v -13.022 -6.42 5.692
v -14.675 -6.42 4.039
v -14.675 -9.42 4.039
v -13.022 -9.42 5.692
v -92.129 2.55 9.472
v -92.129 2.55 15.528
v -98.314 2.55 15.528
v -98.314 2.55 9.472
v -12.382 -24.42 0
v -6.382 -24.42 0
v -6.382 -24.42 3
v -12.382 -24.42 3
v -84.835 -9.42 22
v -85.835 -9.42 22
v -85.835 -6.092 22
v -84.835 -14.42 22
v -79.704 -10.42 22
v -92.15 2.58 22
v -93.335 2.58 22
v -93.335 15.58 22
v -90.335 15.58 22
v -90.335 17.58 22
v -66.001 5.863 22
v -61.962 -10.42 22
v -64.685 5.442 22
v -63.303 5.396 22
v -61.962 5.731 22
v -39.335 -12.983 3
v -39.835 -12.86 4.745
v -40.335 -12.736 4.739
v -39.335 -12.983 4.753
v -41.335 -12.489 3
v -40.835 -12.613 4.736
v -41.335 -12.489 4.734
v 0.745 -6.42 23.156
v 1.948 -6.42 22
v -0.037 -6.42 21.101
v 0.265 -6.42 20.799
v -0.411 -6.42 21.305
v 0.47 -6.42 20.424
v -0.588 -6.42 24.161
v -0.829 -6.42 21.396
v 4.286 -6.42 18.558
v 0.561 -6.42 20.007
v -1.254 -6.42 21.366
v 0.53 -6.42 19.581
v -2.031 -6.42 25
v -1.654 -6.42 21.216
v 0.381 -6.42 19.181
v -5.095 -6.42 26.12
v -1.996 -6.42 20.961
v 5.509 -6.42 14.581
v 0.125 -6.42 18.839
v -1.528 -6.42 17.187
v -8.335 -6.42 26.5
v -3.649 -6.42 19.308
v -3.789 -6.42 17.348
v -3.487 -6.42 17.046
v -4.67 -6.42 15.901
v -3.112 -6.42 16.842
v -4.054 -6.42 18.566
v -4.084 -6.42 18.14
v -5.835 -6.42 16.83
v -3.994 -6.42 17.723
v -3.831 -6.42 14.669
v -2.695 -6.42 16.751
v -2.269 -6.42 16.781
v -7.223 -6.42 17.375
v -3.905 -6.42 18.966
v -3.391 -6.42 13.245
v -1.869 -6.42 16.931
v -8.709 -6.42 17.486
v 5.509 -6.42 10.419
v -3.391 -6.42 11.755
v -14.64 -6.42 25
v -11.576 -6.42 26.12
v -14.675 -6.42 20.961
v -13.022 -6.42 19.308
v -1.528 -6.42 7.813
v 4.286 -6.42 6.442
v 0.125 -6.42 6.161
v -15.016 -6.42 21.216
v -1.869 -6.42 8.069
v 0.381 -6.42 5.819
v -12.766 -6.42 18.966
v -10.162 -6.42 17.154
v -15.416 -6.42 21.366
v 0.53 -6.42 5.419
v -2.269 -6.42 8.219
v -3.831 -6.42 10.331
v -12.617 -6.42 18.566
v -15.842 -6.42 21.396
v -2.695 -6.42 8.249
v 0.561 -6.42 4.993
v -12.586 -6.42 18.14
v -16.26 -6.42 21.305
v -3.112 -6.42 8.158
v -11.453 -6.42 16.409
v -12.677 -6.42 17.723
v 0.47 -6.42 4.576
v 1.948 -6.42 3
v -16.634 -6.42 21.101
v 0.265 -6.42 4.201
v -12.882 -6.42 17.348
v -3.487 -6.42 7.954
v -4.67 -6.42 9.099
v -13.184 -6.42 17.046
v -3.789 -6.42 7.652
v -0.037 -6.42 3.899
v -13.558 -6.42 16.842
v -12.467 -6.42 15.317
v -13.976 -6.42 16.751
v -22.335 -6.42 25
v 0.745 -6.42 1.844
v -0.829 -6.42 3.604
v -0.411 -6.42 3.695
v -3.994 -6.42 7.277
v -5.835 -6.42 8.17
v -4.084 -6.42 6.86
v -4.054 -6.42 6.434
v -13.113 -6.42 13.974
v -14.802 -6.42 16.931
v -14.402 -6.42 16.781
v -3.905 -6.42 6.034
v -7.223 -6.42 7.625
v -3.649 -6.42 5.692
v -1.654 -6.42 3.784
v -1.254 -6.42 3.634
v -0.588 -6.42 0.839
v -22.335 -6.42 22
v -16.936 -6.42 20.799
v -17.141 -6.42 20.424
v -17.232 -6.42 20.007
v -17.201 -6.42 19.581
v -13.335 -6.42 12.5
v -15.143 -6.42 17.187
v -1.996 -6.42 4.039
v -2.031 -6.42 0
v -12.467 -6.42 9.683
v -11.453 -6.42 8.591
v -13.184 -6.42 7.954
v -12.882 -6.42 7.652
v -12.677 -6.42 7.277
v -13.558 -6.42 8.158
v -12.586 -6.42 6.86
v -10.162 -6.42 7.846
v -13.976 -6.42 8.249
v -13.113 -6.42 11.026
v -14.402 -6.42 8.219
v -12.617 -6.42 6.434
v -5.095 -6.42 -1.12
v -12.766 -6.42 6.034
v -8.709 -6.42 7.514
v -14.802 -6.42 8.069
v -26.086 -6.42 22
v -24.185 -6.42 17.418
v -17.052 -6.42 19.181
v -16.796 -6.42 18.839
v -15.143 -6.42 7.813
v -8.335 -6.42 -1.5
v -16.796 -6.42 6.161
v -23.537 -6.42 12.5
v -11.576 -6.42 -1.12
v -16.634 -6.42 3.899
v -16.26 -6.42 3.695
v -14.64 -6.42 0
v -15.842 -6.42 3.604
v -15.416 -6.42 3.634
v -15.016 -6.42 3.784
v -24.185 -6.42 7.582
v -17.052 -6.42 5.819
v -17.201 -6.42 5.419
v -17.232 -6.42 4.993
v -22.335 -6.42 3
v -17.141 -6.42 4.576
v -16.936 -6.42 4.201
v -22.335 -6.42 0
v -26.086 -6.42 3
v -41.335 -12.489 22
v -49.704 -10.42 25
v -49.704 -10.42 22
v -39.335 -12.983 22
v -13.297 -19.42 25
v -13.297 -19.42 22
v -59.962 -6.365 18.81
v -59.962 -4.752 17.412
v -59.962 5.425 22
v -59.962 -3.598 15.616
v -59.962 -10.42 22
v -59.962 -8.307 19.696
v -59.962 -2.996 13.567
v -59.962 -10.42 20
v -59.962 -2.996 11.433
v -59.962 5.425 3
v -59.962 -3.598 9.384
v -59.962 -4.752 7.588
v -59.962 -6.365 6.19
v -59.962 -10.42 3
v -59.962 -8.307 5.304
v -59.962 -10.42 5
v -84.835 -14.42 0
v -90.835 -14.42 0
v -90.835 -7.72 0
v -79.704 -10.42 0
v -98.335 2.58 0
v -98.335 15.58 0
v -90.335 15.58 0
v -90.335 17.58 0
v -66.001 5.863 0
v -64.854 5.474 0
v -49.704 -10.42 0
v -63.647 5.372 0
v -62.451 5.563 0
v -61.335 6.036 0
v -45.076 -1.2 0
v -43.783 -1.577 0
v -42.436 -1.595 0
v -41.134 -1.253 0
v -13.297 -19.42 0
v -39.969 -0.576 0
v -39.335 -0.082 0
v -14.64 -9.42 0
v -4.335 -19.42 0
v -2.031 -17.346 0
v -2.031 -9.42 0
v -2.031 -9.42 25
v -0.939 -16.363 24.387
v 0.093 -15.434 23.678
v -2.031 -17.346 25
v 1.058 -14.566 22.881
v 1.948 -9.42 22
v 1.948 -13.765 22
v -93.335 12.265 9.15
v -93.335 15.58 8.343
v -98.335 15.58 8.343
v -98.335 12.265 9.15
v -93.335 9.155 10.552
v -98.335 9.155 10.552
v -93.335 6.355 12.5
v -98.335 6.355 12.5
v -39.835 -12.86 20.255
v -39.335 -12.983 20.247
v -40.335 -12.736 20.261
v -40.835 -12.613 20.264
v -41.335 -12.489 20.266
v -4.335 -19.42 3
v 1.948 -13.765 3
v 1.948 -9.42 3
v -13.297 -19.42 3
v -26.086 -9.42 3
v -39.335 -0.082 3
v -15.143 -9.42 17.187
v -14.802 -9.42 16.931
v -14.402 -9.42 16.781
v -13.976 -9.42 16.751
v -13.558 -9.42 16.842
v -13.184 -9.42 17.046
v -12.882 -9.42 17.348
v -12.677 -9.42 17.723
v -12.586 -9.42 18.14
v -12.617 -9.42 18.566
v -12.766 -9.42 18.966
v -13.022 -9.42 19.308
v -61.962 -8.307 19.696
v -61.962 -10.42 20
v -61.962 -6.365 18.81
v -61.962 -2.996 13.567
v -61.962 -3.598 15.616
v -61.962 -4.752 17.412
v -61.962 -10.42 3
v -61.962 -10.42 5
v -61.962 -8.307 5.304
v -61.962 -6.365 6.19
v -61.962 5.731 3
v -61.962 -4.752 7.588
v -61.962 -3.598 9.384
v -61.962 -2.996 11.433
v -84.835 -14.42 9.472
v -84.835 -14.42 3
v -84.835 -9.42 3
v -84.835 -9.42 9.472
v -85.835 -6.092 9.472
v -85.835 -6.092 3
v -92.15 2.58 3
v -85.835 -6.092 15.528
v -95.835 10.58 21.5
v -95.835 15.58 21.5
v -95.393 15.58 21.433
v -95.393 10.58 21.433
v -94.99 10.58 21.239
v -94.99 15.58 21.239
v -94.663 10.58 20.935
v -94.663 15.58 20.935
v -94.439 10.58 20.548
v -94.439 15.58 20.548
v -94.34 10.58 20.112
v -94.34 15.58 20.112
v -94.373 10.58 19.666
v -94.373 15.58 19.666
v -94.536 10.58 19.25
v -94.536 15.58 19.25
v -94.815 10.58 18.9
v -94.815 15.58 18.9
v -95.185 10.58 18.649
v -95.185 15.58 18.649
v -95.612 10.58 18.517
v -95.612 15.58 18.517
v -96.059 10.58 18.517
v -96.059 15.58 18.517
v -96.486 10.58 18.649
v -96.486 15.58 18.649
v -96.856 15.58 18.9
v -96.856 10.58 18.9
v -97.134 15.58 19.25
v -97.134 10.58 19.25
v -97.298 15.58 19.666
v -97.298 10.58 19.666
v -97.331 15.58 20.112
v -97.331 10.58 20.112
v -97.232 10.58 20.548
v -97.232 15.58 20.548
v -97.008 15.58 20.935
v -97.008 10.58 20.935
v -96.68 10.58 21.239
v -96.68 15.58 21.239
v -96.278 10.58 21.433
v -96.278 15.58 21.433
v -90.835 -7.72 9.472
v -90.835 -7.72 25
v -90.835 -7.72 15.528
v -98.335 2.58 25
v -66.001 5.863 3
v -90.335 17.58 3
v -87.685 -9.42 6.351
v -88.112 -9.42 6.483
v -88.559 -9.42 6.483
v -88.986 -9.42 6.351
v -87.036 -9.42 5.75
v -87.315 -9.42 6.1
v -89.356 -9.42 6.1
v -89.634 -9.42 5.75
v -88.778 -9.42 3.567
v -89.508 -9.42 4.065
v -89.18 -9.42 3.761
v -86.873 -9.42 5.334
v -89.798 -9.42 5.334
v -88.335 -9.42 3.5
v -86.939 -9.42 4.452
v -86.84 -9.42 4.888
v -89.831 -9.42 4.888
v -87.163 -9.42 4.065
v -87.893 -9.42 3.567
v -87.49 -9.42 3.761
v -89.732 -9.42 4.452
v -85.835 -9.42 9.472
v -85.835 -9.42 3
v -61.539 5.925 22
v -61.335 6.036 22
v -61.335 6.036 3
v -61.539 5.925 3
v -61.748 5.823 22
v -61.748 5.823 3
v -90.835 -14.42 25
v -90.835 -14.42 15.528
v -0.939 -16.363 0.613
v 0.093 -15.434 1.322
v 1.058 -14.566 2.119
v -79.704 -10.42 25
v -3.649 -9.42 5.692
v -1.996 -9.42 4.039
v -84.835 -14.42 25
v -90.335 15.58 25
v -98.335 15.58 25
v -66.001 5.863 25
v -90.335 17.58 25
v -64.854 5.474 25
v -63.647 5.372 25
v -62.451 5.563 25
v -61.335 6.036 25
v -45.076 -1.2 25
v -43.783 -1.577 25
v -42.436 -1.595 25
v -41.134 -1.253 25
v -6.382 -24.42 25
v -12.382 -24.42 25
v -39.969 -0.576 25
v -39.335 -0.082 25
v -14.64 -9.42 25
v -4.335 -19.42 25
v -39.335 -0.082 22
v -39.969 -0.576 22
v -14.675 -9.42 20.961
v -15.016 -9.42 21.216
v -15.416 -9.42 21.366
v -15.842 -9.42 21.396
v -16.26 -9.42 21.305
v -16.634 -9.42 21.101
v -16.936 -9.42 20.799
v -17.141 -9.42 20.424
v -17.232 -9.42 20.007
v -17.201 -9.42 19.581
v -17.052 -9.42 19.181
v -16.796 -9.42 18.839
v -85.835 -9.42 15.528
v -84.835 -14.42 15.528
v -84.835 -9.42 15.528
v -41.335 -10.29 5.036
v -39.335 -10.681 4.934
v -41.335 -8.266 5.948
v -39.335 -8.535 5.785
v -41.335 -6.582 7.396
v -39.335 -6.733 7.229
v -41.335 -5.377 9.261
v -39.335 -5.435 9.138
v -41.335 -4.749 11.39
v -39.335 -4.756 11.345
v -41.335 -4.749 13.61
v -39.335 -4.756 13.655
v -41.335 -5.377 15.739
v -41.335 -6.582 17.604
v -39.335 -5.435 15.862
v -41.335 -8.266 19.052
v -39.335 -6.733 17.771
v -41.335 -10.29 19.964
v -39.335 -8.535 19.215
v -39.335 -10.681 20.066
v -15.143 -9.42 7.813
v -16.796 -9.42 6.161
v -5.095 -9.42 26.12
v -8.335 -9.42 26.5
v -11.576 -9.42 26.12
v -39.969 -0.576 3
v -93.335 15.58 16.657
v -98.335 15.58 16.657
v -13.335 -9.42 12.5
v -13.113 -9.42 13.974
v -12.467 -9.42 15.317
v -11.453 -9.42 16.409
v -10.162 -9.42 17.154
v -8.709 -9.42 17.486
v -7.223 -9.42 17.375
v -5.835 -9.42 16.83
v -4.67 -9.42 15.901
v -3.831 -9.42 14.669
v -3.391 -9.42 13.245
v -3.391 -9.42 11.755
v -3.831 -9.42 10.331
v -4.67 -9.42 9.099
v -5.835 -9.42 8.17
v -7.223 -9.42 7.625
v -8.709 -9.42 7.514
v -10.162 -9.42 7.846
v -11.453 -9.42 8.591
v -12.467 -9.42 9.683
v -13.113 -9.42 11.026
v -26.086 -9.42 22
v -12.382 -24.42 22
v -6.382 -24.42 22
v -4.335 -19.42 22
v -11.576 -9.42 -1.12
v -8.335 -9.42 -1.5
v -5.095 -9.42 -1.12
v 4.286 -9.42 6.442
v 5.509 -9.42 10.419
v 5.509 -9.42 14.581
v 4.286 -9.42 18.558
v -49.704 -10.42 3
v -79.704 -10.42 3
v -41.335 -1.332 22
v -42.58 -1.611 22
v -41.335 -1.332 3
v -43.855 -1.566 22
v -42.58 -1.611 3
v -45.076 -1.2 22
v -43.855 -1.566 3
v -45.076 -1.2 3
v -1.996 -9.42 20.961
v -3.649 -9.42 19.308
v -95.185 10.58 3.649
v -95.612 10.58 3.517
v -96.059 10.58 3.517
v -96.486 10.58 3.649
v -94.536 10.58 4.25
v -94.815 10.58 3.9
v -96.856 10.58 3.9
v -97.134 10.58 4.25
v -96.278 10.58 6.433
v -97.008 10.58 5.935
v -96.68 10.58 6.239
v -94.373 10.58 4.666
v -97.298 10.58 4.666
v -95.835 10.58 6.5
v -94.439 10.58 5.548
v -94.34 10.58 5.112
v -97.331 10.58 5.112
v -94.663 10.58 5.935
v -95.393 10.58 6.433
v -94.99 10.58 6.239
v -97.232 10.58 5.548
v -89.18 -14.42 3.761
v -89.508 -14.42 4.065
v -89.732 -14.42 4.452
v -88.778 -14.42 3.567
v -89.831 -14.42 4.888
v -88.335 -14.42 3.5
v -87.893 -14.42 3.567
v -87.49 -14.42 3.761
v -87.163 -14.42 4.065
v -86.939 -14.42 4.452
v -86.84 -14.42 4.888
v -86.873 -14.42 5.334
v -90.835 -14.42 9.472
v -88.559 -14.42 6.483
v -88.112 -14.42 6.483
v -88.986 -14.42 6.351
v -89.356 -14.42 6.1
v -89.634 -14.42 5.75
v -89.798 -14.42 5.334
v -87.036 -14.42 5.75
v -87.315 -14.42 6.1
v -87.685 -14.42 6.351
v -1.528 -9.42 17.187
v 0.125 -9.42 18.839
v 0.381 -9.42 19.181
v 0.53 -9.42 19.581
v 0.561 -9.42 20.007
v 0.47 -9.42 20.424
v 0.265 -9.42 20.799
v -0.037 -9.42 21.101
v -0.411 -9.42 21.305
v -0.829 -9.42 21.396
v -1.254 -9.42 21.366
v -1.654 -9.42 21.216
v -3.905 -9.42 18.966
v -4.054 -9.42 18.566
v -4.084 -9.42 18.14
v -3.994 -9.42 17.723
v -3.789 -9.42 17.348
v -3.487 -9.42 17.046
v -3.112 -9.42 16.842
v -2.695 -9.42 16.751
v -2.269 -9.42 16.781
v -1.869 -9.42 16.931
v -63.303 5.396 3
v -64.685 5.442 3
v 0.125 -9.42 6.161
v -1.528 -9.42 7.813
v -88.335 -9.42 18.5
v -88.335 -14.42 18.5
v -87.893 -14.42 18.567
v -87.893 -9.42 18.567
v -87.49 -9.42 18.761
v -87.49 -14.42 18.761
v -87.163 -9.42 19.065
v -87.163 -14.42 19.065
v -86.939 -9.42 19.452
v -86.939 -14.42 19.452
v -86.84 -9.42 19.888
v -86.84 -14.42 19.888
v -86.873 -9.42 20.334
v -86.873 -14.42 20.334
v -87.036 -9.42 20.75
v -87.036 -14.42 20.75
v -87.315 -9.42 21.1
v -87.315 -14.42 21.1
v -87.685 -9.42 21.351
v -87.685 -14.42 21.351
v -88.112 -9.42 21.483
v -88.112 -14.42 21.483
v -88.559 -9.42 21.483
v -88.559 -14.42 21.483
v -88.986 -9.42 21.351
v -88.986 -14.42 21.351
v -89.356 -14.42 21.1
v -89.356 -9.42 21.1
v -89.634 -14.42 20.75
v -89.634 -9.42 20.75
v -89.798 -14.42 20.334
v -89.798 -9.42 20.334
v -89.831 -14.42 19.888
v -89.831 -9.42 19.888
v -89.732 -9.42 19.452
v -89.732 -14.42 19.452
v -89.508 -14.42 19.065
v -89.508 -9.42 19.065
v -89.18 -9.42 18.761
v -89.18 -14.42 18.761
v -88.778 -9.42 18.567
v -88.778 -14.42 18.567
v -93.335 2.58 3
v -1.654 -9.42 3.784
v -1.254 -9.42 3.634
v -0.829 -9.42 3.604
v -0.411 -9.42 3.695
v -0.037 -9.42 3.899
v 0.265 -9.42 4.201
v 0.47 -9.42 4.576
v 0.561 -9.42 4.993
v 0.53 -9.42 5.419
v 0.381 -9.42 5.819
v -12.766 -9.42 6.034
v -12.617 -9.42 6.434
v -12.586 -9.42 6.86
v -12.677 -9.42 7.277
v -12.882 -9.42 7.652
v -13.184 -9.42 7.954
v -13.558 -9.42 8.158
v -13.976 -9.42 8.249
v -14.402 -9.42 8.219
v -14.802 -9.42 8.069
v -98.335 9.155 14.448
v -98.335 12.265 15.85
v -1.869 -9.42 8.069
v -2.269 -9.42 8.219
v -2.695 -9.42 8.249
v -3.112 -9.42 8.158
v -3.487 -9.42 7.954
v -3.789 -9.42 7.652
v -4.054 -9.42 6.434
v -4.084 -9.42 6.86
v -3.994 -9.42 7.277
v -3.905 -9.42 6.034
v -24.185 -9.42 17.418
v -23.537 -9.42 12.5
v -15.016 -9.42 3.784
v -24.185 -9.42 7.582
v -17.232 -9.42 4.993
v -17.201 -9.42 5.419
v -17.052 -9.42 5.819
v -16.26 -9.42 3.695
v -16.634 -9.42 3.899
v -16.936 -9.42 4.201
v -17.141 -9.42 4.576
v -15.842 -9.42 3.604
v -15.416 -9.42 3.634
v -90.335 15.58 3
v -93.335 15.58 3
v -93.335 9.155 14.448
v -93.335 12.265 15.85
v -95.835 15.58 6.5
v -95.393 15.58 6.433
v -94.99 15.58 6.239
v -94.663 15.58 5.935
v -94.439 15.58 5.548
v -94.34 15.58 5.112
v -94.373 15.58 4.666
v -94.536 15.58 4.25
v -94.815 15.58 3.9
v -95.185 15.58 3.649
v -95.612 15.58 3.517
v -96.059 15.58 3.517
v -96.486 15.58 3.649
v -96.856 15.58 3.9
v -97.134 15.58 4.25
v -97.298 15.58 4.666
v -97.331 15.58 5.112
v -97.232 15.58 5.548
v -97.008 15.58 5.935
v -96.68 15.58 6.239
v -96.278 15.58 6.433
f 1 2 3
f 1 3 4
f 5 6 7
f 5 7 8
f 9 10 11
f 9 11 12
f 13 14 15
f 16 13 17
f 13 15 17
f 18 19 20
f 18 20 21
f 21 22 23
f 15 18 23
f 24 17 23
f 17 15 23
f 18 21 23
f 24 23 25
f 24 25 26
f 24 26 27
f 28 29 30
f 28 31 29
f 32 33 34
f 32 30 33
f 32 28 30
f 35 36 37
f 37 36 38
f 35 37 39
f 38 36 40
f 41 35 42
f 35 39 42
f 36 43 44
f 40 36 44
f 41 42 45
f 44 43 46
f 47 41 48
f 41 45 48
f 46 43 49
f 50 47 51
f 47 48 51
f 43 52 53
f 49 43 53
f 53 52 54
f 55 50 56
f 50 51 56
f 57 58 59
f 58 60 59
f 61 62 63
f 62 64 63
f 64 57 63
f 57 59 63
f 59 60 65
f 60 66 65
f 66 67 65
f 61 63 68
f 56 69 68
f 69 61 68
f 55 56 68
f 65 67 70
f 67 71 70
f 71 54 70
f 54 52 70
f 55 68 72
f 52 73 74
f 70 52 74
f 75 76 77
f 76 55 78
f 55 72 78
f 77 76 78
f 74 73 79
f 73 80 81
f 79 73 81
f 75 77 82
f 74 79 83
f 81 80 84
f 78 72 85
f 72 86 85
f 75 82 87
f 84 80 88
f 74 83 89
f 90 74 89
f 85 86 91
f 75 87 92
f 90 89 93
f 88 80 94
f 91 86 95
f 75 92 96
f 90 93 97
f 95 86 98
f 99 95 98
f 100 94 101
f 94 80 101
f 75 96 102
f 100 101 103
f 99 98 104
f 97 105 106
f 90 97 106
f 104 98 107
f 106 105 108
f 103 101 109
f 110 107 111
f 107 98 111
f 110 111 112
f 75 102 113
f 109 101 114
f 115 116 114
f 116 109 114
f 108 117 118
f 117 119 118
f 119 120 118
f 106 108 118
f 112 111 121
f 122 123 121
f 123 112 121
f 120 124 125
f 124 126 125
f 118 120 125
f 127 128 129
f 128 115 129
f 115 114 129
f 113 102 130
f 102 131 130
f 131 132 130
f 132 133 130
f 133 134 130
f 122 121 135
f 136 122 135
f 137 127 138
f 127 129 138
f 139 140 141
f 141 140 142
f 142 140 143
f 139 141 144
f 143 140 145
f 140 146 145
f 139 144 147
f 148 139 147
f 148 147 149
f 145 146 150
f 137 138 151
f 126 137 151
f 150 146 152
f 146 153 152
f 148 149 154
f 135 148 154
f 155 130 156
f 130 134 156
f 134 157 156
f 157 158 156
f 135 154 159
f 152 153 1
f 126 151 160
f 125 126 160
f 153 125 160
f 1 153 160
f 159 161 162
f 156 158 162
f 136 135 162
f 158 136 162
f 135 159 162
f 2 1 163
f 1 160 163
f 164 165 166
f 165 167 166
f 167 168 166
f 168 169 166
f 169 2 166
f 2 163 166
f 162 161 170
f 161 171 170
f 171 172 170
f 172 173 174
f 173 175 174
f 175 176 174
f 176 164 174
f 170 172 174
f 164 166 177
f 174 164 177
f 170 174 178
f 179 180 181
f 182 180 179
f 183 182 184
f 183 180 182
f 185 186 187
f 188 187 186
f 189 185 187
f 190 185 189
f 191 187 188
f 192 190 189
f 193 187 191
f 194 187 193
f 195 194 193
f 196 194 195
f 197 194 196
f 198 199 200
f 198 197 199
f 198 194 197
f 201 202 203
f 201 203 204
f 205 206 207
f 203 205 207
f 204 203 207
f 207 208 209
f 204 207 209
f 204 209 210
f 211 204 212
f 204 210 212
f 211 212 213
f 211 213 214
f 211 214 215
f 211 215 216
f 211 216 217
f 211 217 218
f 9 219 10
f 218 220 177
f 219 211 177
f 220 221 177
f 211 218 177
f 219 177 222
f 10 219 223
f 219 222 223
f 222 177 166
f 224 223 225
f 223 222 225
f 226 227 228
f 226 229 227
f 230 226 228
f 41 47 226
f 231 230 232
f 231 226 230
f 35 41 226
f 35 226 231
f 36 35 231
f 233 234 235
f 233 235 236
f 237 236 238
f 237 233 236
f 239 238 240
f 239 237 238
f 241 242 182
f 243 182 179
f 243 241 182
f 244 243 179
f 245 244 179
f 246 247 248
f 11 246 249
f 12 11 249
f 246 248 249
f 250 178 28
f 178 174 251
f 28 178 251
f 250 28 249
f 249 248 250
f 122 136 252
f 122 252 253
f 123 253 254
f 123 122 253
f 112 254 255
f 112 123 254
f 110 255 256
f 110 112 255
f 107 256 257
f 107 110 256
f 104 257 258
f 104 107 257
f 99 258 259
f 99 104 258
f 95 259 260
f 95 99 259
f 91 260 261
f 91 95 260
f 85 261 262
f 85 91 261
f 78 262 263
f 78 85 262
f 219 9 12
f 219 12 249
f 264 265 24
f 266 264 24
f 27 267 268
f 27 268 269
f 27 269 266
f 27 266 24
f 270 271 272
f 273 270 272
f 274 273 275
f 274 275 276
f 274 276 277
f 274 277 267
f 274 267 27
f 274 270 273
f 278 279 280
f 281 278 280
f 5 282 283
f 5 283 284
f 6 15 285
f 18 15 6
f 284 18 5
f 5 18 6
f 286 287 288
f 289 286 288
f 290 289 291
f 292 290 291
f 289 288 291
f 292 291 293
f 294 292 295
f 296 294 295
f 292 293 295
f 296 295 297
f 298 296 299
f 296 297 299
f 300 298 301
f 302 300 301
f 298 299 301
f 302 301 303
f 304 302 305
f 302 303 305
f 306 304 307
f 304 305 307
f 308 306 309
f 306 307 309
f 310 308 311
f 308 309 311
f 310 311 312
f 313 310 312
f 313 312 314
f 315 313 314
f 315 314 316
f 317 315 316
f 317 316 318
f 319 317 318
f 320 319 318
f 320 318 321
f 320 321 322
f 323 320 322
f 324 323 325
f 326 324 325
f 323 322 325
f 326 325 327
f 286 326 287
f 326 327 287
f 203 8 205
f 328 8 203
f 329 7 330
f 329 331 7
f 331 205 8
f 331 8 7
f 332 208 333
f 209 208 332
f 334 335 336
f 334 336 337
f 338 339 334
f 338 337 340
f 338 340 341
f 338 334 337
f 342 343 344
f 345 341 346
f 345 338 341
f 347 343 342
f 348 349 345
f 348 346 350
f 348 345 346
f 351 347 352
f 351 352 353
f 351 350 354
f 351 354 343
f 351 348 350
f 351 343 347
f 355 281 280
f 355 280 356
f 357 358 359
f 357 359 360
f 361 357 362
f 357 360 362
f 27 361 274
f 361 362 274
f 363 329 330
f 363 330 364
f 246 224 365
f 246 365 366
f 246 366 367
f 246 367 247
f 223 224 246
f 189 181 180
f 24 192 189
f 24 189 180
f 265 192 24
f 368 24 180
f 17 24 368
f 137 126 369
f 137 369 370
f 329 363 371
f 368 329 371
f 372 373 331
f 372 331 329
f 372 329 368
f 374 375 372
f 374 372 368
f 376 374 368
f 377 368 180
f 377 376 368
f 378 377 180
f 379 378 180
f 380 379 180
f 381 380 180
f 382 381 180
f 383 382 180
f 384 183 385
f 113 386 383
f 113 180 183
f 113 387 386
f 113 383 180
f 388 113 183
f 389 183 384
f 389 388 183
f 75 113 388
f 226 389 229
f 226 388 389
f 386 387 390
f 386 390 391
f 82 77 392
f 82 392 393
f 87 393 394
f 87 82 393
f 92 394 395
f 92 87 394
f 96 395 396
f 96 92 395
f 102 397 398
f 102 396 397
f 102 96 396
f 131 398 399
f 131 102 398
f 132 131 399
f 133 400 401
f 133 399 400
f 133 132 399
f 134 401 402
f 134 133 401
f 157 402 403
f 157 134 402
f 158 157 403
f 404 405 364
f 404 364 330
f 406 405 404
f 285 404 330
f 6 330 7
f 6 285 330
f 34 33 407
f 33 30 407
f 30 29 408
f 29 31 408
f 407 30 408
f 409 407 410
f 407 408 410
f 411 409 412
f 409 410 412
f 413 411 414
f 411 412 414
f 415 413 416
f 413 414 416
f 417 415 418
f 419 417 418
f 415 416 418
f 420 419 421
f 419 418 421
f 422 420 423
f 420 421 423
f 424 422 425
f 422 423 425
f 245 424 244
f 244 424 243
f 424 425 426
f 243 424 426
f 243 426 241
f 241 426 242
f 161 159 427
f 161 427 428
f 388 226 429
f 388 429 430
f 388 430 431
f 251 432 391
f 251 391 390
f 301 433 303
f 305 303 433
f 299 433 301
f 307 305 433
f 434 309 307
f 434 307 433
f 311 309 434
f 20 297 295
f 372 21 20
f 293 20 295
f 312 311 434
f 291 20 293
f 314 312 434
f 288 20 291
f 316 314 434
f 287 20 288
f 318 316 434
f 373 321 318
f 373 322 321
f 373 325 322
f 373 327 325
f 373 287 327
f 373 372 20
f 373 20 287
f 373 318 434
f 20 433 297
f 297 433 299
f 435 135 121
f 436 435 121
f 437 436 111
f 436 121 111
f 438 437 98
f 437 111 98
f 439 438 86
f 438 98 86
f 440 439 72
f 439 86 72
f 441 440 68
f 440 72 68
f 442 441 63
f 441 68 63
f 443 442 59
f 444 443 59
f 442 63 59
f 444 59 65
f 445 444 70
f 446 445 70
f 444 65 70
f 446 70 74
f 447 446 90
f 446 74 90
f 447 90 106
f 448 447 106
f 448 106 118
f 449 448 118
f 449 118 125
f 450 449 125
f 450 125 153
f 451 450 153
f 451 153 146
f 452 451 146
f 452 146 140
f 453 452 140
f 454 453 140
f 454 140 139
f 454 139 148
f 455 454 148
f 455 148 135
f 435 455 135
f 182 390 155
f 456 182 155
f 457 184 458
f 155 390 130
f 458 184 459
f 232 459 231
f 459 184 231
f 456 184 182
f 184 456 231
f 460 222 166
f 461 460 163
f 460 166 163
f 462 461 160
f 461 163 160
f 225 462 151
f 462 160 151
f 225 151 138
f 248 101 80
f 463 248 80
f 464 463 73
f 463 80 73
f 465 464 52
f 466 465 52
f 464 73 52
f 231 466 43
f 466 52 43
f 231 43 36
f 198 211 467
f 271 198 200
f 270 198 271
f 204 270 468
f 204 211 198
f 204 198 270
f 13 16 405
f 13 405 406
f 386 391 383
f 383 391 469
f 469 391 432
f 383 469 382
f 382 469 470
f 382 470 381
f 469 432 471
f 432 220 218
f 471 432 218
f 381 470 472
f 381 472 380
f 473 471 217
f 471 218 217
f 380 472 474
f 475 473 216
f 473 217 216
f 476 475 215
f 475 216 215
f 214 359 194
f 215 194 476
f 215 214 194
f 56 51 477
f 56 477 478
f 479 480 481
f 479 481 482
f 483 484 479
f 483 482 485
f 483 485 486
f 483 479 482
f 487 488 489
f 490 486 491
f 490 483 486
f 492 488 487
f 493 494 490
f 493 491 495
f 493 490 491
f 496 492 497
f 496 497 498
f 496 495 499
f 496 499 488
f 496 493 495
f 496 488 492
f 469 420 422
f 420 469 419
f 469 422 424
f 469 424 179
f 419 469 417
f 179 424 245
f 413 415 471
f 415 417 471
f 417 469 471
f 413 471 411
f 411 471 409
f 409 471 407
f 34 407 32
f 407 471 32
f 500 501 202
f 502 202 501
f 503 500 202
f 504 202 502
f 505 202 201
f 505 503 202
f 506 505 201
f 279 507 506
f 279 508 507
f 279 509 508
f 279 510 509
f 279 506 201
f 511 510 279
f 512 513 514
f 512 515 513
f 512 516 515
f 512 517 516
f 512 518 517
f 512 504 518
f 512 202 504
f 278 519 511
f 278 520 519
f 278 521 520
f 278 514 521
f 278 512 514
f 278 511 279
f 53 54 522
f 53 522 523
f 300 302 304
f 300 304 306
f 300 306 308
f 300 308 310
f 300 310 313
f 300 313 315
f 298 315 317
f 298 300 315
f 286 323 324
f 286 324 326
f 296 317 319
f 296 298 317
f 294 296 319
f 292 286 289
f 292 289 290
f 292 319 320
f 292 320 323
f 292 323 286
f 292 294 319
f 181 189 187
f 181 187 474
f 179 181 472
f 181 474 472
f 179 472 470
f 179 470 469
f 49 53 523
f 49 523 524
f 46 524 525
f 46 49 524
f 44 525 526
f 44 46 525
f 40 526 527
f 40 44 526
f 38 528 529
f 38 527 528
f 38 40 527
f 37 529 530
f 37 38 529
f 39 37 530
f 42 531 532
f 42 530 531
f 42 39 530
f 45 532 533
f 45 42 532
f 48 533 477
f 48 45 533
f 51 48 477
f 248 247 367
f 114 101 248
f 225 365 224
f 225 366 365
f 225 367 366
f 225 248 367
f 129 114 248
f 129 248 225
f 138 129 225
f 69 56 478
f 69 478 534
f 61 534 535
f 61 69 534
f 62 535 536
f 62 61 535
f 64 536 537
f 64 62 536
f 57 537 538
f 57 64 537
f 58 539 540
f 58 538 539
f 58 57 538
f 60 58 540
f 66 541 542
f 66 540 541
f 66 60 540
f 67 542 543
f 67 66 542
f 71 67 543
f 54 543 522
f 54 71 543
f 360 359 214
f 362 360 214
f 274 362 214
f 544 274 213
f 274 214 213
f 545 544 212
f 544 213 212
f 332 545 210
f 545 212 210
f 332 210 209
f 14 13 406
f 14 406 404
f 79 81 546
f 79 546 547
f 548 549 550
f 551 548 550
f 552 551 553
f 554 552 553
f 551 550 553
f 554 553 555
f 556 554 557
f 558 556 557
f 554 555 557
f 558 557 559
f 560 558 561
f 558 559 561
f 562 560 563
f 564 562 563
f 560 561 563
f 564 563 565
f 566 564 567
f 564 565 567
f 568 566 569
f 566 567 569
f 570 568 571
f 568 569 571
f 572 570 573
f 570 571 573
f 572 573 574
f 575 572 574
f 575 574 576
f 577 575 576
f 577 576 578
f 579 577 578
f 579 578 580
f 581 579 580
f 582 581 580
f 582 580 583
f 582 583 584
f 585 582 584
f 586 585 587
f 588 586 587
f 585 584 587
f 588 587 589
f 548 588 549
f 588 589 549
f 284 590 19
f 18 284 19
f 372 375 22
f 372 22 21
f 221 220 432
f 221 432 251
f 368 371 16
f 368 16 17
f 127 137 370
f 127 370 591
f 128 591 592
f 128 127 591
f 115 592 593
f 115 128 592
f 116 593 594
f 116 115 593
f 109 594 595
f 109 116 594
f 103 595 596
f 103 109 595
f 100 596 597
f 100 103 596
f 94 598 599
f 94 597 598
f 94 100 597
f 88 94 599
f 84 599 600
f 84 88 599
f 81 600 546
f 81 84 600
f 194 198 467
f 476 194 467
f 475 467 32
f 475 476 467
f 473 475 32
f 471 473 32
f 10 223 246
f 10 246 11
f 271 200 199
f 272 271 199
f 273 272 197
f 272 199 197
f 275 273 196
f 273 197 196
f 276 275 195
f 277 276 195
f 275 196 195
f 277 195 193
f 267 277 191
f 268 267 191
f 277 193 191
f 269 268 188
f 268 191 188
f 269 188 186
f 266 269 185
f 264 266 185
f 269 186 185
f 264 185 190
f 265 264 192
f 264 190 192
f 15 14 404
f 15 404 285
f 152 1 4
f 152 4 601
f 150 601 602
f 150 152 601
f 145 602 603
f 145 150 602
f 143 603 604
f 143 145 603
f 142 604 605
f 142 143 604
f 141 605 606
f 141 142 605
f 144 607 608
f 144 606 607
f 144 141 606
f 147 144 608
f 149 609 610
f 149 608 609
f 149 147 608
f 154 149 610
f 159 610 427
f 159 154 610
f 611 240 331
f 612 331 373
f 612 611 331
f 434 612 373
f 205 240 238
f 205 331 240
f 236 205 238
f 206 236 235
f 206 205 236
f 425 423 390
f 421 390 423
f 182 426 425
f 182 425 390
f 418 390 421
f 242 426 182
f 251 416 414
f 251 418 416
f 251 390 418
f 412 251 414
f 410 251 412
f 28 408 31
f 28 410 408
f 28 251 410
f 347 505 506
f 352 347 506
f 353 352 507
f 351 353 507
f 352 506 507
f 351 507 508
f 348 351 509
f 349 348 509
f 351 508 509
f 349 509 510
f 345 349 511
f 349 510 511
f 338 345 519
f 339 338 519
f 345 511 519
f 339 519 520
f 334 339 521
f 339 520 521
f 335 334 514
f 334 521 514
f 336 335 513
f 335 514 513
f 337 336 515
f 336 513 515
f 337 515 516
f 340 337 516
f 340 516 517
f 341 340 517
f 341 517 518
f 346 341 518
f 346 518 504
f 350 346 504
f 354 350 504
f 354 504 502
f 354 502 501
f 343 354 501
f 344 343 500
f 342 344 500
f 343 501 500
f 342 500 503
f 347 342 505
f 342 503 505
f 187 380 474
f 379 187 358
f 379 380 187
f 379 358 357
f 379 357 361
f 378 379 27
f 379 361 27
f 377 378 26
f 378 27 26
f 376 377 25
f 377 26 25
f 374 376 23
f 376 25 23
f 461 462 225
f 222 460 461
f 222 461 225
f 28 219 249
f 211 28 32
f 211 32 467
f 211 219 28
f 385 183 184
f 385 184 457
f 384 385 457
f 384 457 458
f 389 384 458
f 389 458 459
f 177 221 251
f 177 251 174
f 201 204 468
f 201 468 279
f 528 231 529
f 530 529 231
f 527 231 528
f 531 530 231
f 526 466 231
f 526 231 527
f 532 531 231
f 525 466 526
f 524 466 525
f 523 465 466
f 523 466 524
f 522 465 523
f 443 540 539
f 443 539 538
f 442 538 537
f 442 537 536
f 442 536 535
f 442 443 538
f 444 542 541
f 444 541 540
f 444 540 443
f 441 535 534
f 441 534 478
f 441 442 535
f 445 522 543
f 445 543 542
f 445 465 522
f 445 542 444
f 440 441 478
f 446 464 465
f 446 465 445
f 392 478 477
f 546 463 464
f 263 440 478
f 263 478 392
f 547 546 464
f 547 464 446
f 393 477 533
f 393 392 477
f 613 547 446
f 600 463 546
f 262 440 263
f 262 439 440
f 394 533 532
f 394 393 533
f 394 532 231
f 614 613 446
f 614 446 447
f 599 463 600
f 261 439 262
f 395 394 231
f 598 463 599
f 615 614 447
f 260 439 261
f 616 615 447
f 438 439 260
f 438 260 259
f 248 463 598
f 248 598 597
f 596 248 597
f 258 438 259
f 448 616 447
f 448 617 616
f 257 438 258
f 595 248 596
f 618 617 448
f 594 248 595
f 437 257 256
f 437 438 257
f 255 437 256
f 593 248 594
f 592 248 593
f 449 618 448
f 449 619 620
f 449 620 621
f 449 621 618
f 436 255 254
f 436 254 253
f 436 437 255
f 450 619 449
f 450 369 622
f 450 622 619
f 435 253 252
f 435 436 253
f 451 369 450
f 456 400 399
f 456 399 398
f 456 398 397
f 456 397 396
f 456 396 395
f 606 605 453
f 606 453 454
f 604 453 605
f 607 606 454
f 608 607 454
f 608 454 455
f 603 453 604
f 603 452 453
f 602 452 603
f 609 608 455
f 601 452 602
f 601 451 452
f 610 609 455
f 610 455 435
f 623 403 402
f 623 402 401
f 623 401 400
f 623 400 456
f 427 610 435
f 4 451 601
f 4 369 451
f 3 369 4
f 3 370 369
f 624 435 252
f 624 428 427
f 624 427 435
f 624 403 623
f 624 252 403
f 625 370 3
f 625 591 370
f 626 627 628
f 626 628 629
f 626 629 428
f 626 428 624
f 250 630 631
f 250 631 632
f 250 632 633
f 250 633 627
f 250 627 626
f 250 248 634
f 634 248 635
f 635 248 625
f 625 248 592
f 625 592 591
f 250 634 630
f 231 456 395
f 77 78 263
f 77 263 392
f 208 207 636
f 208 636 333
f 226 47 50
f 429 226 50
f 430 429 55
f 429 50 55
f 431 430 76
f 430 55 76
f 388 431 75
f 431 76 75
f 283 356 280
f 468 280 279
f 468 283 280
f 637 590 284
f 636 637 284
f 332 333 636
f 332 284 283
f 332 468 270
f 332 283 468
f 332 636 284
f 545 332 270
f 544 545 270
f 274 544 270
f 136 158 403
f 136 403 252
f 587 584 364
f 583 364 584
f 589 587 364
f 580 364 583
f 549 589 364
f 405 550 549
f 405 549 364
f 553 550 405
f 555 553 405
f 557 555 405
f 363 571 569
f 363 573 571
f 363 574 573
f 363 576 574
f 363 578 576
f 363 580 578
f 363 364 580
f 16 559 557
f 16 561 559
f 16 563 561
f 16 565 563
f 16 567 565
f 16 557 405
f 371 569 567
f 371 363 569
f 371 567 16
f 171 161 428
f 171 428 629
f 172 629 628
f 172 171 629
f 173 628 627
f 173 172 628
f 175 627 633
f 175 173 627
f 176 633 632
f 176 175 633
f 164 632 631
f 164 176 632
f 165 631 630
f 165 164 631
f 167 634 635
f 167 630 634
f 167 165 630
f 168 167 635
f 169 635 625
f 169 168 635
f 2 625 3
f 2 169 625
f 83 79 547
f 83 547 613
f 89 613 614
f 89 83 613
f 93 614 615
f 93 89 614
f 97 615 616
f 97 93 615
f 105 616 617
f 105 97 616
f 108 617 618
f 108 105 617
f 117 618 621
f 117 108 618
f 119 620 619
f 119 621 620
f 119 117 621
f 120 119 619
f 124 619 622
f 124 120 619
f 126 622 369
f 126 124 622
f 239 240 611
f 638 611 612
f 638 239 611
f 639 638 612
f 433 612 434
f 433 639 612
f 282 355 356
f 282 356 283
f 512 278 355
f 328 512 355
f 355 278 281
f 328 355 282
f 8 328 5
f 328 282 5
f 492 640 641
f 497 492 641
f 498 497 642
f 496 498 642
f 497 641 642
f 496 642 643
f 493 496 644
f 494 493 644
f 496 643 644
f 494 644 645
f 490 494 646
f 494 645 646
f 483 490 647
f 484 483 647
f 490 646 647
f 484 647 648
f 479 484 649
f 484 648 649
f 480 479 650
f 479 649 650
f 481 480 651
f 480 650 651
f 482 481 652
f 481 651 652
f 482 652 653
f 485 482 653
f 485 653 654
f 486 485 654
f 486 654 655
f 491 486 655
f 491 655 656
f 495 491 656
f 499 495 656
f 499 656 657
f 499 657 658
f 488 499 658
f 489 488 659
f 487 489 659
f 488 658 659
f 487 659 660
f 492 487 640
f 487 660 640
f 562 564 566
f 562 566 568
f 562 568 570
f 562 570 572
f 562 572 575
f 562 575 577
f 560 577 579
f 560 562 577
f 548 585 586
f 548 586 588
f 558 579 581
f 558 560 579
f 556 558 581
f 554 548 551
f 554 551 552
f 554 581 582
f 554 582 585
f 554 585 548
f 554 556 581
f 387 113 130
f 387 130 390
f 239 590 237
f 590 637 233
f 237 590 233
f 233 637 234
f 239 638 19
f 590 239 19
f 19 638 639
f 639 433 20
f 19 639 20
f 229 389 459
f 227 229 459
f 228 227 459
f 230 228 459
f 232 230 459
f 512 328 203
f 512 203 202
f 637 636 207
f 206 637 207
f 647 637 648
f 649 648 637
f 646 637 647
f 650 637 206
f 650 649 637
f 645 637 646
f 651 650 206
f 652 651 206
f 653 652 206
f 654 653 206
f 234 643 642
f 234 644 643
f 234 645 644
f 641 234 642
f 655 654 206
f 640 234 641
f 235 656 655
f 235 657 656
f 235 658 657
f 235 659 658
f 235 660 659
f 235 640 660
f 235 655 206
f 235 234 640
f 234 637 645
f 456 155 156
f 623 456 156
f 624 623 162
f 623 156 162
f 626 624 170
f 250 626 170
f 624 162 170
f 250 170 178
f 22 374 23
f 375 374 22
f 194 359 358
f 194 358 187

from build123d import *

# Parameters (mm, degrees)
EXTRUDE_1_DEPTH     = 3
SKETCH_2_W          = 25
SKETCH_2_H          = 13
EXTRUDE_2_DEPTH     = 5
EXTRUDE_3_DEPTH     = 3
EXTRUDE_4_REACH     = 106.361
CUT_EXTRUDE_1_DEPTH = 105.987345913
SKETCH_6_W          = 6.056667596
SKETCH_6_H          = 33.940287548
CUT_EXTRUDE_2_DEPTH = 98.013364038
EXTRUDE_5_REACH     = 106.361
CUT_EXTRUDE_3_DEPTH = 3
CUT_EXTRUDE_4_DEPTH = 3
EXTRUDE_6_DEPTH     = 3
CUT_EXTRUDE_5_DEPTH = 105.633226751
SKETCH_12_R         = 5
CUT_EXTRUDE_6_DEPTH = 5
SKETCH_13_R         = 1.5
CUT_EXTRUDE_7_DEPTH = 5
SKETCH_14_R         = 1.5
CUT_EXTRUDE_8_DEPTH = 5
FILLET_1_DEPTH      = 3
FILLET_START        = 22
FILLET_1_2_DEPTH    = 3
FILLET_START_2      = 2.3595
FILLET_1_3_DEPTH    = 20


with BuildPart() as part:
    # 草图1 → 凸台-拉伸1 (new body)
    with BuildSketch(Plane.XY):
        Polygon((-98.335457187, 15.579868922), (-90.335457187, 15.579868922), (-90.335457187, 17.579868922), (-63.335457187, 4.579868922), (-61.335457187, 6.036256747), (-42.335457187, -2.420131078), (-39.335457187, -0.081665222), (-22.335457187, -6.420131078), (-10.835457187, -6.420131078), (5.664542813, -6.420131078), (5.664542813, -10.420131078), (-4.335457187, -19.420131078), (-6.381981311, -24.420131078), (-12.381981311, -24.420131078), (-13.29747583, -19.420131078), (-49.703887716, -10.420131078), (-79.703887716, -10.420131078), (-84.835457187, -14.420131078), (-90.835457187, -14.420131078), (-90.835457187, -7.719585483), (-98.335457187, 2.579868922), align=None)
    extrude(amount=EXTRUDE_1_DEPTH)

    # 草图2 → 凸台-拉伸2 (add)
    with BuildSketch(Plane.ZY.offset(98.335457187)):
        with Locations((12.5, 9.079868922)):
            Rectangle(SKETCH_2_W, SKETCH_2_H)
    extrude(amount=-EXTRUDE_2_DEPTH)

    # 草图3 → 凸台-拉伸3 (add)
    with BuildSketch(Plane.XY.offset(25)):
        Polygon((-90.335457187, 15.579868922), (-98.335457187, 15.579868922), (-98.335457187, 2.579868922), (-90.835457187, -7.719585483), (-90.835457187, -14.420131078), (-84.835457187, -14.420131078), (-79.703887716, -10.420131078), (-49.703887716, -10.420131078), (-13.29747583, -19.420131078), (-12.381981311, -24.420131078), (-6.381981311, -24.420131078), (-4.335457187, -19.420131078), (5.664542813, -10.420131078), (5.664542813, -6.420131078), (-22.335457187, -6.420131078), (-39.335457187, -0.081665222), (-42.335457187, -2.420131078), (-61.335457187, 6.036256747), (-63.335457187, 4.579868922), (-90.335457187, 17.579868922), align=None)
    extrude(amount=-EXTRUDE_3_DEPTH)

    # 草图4 → 凸台-拉伸4 (add, up to next)
    with BuildSketch(Plane.XY.offset(25), mode=Mode.PRIVATE) as extrude_4_sk1:
        Polygon((-98.335457187, 2.579868922), (-90.835457187, -7.719585483), (-90.835457187, -14.420131078), (-84.835457187, -14.420131078), (-84.835457187, -9.420131078), (-85.835457187, -9.420131078), (-85.835457187, -6.09200144), (-92.150260395, 2.579868922), align=None)
    extrude_4_tool1 = extrude(extrude_4_sk1.sketch, amount=-EXTRUDE_4_REACH, mode=Mode.PRIVATE) - part.part
    add(extrude_4_tool1.solids().sort_by_distance((-90.201592, -5.80053, 25))[0])

    # 草图5 → 切除-拉伸1 (cut, through all)
    with BuildSketch(Plane(origin=(-93.335457187, 0, 0), x_dir=(0, 0, -1), z_dir=(1, 0, 0))):
        with BuildLine():
            Line((-16.657130076, 15.579868922), (-8.342869924, 15.579868922))
            ThreePointArc((-8.342869924, 15.579868922), (-9.779019247, 10.678144674), (-12.5, 6.355450003))
            ThreePointArc((-12.5, 6.355450003), (-15.220980753, 10.678144674), (-16.657130076, 15.579868922))
        make_face()
    extrude(amount=-CUT_EXTRUDE_1_DEPTH, mode=Mode.SUBTRACT)

    # 草图6 → 切除-拉伸2 (cut, through all)
    with BuildSketch(Plane(origin=(-84.835457187, 0, 0), x_dir=(0, 0, -1), z_dir=(1, 0, 0))):
        with Locations((-12.5, -14.420131078)):
            Rectangle(SKETCH_6_W, SKETCH_6_H)
    extrude(amount=-CUT_EXTRUDE_2_DEPTH, mode=Mode.SUBTRACT)

    # 草图7 → 凸台-拉伸5 (add, up to next)
    with BuildSketch(Plane(origin=(0, 0, 0), x_dir=(-1, 0, 0), z_dir=(0, 0, -1)), mode=Mode.PRIVATE) as extrude_5_sk1:
        Polygon((41.335457187, -1.64064246), (39.335457187, -0.081665222), (39.335457187, -12.983302507), (41.335457187, -12.488884104), align=None)
    extrude_5_tool1 = extrude(extrude_5_sk1.sketch, amount=-EXTRUDE_5_REACH, mode=Mode.PRIVATE) - part.part
    # 草图7 → 凸台-拉伸5 (add, up to next)
    with BuildSketch(Plane(origin=(0, 0, 0), x_dir=(-1, 0, 0), z_dir=(0, 0, -1)), mode=Mode.PRIVATE) as extrude_5_sk2:
        Polygon((59.961995831, 5.424966121), (59.961995831, -10.420131078), (61.961995831, -10.420131078), (61.961995831, 5.580015121), (61.335457187, 6.036256747), align=None)
    extrude_5_tool2 = extrude(extrude_5_sk2.sketch, amount=-EXTRUDE_5_REACH, mode=Mode.PRIVATE) - part.part
    add(extrude_5_tool1.solids().sort_by_distance((-40.306637, -6.790953, 0))[0])
    add(extrude_5_tool2.solids().sort_by_distance((-60.965536, -2.331748, 0))[0])

    # 草图8 → 切除-拉伸3 (cut)
    with BuildSketch(Plane(origin=(-39.335457187, 0, 0), x_dir=(0, 0, -1), z_dir=(1, 0, 0))):
        with BuildLine():
            Line((-20.2471791, -12.983302507), (-4.7528209, -12.983302507))
            ThreePointArc((-4.7528209, -12.983302507), (-12.5, -4.669641244), (-20.2471791, -12.983302507))
        make_face()
    extrude(amount=-CUT_EXTRUDE_3_DEPTH, mode=Mode.SUBTRACT)

    # 草图9 → 切除-拉伸4 (cut)
    with BuildSketch(Plane(origin=(-59.961995831, 0, 0), x_dir=(0, 0, -1), z_dir=(1, 0, 0))):
        with BuildLine():
            Line((-20.000265411, -10.420131078), (-4.999734589, -10.420131078))
            ThreePointArc((-4.999734589, -10.420131078), (-12.5, -2.919865667), (-20.000265411, -10.420131078))
        make_face()
    extrude(amount=-CUT_EXTRUDE_4_DEPTH, mode=Mode.SUBTRACT)

    # 草图10 → 凸台-拉伸6 (add)
    with BuildSketch(Plane(origin=(0, -6.420131078, 0), x_dir=(1, 0, 0), z_dir=(0, 1, 0))):
        with BuildLine():
            Line((-26.085728059, -3), (-26.085728059, 0))
            Line((-26.085728059, 0), (-14.640217294, 0))
            ThreePointArc((-14.640217294, 0), (5.664542813, -12.5), (-14.640217294, -25))
            Line((-14.640217294, -25), (-26.085728059, -25))
            Line((-26.085728059, -25), (-26.085728059, -22))
            ThreePointArc((-26.085728059, -22), (-23.536750664, -12.5), (-26.085728059, -3))
        make_face()
    extrude(amount=-EXTRUDE_6_DEPTH)

    # 草图11 → 切除-拉伸5 (cut, through all)
    with BuildSketch(Plane(origin=(0, -6.420131078, 0), x_dir=(1, 0, 0), z_dir=(0, 1, 0))):
        with BuildLine():
            Line((-2.030697081, 0), (16.123773985, 18.747228403))
            Line((16.123773985, 18.747228403), (16.123773985, -39.39165183))
            Line((16.123773985, -39.39165183), (-2.030697081, -25))
            ThreePointArc((-2.030697081, -25), (5.664542813, -12.5), (-2.030697081, 0))
        make_face()
    extrude(amount=-CUT_EXTRUDE_5_DEPTH, mode=Mode.SUBTRACT)

    # 草图12 → 切除-拉伸6 (cut)
    with BuildSketch(Plane(origin=(0, -6.420131078, 0), x_dir=(1, 0, 0), z_dir=(0, 1, 0))):
        with Locations(Location((-8.335457187, -12.5, 0), (0, 0, 180))):
            Circle(SKETCH_12_R)
        with BuildLine():
            Line((-1.527591385, -17.186545459), (0.125093583, -18.839230427))
            ThreePointArc((0.125093583, -18.839230427), (0.125093583, -20.960550771), (-1.99622676, -20.960550771))
            Line((-1.99622676, -20.960550771), (-3.648911729, -19.307865802))
            ThreePointArc((-3.648911729, -19.307865802), (-3.648911729, -17.186545459), (-1.527591385, -17.186545459))
        make_face()
        with BuildLine():
            Line((-13.022002646, -19.307865802), (-14.674687614, -20.960550771))
            ThreePointArc((-14.674687614, -20.960550771), (-16.796007958, -20.960550771), (-16.796007958, -18.839230427))
            Line((-16.796007958, -18.839230427), (-15.143322989, -17.186545459))
            ThreePointArc((-15.143322989, -17.186545459), (-13.022002646, -17.186545459), (-13.022002646, -19.307865802))
        make_face()
        with BuildLine():
            Line((-15.143322989, -7.813454541), (-16.796007958, -6.160769573))
            ThreePointArc((-16.796007958, -6.160769573), (-16.796007958, -4.039449229), (-14.674687614, -4.039449229))
            Line((-14.674687614, -4.039449229), (-13.022002646, -5.692134198))
            ThreePointArc((-13.022002646, -5.692134198), (-13.022002646, -7.813454541), (-15.143322989, -7.813454541))
        make_face()
        with BuildLine():
            Line((-3.648911729, -5.692134198), (-1.99622676, -4.039449229))
            ThreePointArc((-1.99622676, -4.039449229), (0.125093583, -4.039449229), (0.125093583, -6.160769573))
            Line((0.125093583, -6.160769573), (-1.527591385, -7.813454541))
            ThreePointArc((-1.527591385, -7.813454541), (-3.648911729, -7.813454541), (-3.648911729, -5.692134198))
        make_face()
    extrude(amount=-CUT_EXTRUDE_6_DEPTH, mode=Mode.SUBTRACT)

    # 草图13 → 切除-拉伸7 (cut)
    with BuildSketch(Plane(origin=(0, 15.579868922, 0), x_dir=(1, 0, 0), z_dir=(0, 1, 0))):
        with Locations(Location((-95.835457187, -5, 0), (0, 0, 270))):
            Circle(SKETCH_13_R)
        with Locations(Location((-95.835457187, -20, 0), (0, 0, 270))):
            Circle(SKETCH_13_R)
    extrude(amount=-CUT_EXTRUDE_7_DEPTH, mode=Mode.SUBTRACT)

    # 草图14 → 切除-拉伸8 (cut)
    with BuildSketch(Plane.XZ.offset(14.420131078)):
        with Locations(Location((-88.335457187, 20, 0), (0, 0, 270))):
            Circle(SKETCH_14_R)
        with Locations(Location((-88.335457187, 5, 0), (0, 0, 270))):
            Circle(SKETCH_14_R)
    extrude(amount=-CUT_EXTRUDE_8_DEPTH, mode=Mode.SUBTRACT)

    # 圆角1: read off the stored shape, not the designer's step
    # 圆角1 outline → 圆角1 (add)
    with BuildSketch(Plane.XY):
        with BuildLine():
            ThreePointArc((-39.969314292, -0.575749621), (-42.436321647, -1.595291169), (-45.076309168, -1.200251746))
            Line((-45.076309168, -1.200251746), (-42.335457187, -2.420131078))
            Line((-42.335457187, -2.420131078), (-39.969314292, -0.575749621))
        make_face()
        with BuildLine():
            ThreePointArc((-61.335457187, 6.036256747), (-63.646870744, 5.371779089), (-66.001128729, 5.863340405))
            Line((-66.001128729, 5.863340405), (-63.335457187, 4.579868922))
            Line((-63.335457187, 4.579868922), (-61.335457187, 6.036256747))
        make_face()
    extrude(amount=FILLET_1_DEPTH)

    # Fillet 1 2 outline → Fillet 1 2 (add)
    with BuildSketch(Plane.XY.offset(FILLET_START)):
        with BuildLine():
            ThreePointArc((-39.969314292, -0.575749621), (-42.436321647, -1.595291169), (-45.076309168, -1.200251746))
            Line((-45.076309168, -1.200251746), (-42.335457187, -2.420131078))
            Line((-42.335457187, -2.420131078), (-39.969314292, -0.575749621))
        make_face()
        with BuildLine():
            ThreePointArc((-61.335457187, 6.036256747), (-63.646870744, 5.371779089), (-66.001128729, 5.863340405))
            Line((-66.001128729, 5.863340405), (-63.335457187, 4.579868922))
            Line((-63.335457187, 4.579868922), (-61.335457187, 6.036256747))
        make_face()
    extrude(amount=FILLET_1_2_DEPTH)

    # Fillet 1 3 outline → Fillet 1 3 (add)
    with BuildSketch(Plane.XY.offset(FILLET_START_2)):
        with BuildLine():
            Line((-41.335457187, -1.64064246), (-39.969314292, -0.575749621))
            ThreePointArc((-39.969314292, -0.575749621), (-40.622702266, -1.007314283), (-41.335457187, -1.331573939))
            Line((-41.335457187, -1.331573939), (-41.335457187, -1.64064246))
        make_face()
        with BuildLine():
            Line((-61.961995831, 5.580015121), (-61.335457187, 6.036256747))
            ThreePointArc((-61.335457187, 6.036256747), (-61.643406083, 5.872813744), (-61.961995831, 5.731227337))
            Line((-61.961995831, 5.731227337), (-61.961995831, 5.580015121))
        make_face()
    extrude(amount=FILLET_1_3_DEPTH)


solid = part.part
